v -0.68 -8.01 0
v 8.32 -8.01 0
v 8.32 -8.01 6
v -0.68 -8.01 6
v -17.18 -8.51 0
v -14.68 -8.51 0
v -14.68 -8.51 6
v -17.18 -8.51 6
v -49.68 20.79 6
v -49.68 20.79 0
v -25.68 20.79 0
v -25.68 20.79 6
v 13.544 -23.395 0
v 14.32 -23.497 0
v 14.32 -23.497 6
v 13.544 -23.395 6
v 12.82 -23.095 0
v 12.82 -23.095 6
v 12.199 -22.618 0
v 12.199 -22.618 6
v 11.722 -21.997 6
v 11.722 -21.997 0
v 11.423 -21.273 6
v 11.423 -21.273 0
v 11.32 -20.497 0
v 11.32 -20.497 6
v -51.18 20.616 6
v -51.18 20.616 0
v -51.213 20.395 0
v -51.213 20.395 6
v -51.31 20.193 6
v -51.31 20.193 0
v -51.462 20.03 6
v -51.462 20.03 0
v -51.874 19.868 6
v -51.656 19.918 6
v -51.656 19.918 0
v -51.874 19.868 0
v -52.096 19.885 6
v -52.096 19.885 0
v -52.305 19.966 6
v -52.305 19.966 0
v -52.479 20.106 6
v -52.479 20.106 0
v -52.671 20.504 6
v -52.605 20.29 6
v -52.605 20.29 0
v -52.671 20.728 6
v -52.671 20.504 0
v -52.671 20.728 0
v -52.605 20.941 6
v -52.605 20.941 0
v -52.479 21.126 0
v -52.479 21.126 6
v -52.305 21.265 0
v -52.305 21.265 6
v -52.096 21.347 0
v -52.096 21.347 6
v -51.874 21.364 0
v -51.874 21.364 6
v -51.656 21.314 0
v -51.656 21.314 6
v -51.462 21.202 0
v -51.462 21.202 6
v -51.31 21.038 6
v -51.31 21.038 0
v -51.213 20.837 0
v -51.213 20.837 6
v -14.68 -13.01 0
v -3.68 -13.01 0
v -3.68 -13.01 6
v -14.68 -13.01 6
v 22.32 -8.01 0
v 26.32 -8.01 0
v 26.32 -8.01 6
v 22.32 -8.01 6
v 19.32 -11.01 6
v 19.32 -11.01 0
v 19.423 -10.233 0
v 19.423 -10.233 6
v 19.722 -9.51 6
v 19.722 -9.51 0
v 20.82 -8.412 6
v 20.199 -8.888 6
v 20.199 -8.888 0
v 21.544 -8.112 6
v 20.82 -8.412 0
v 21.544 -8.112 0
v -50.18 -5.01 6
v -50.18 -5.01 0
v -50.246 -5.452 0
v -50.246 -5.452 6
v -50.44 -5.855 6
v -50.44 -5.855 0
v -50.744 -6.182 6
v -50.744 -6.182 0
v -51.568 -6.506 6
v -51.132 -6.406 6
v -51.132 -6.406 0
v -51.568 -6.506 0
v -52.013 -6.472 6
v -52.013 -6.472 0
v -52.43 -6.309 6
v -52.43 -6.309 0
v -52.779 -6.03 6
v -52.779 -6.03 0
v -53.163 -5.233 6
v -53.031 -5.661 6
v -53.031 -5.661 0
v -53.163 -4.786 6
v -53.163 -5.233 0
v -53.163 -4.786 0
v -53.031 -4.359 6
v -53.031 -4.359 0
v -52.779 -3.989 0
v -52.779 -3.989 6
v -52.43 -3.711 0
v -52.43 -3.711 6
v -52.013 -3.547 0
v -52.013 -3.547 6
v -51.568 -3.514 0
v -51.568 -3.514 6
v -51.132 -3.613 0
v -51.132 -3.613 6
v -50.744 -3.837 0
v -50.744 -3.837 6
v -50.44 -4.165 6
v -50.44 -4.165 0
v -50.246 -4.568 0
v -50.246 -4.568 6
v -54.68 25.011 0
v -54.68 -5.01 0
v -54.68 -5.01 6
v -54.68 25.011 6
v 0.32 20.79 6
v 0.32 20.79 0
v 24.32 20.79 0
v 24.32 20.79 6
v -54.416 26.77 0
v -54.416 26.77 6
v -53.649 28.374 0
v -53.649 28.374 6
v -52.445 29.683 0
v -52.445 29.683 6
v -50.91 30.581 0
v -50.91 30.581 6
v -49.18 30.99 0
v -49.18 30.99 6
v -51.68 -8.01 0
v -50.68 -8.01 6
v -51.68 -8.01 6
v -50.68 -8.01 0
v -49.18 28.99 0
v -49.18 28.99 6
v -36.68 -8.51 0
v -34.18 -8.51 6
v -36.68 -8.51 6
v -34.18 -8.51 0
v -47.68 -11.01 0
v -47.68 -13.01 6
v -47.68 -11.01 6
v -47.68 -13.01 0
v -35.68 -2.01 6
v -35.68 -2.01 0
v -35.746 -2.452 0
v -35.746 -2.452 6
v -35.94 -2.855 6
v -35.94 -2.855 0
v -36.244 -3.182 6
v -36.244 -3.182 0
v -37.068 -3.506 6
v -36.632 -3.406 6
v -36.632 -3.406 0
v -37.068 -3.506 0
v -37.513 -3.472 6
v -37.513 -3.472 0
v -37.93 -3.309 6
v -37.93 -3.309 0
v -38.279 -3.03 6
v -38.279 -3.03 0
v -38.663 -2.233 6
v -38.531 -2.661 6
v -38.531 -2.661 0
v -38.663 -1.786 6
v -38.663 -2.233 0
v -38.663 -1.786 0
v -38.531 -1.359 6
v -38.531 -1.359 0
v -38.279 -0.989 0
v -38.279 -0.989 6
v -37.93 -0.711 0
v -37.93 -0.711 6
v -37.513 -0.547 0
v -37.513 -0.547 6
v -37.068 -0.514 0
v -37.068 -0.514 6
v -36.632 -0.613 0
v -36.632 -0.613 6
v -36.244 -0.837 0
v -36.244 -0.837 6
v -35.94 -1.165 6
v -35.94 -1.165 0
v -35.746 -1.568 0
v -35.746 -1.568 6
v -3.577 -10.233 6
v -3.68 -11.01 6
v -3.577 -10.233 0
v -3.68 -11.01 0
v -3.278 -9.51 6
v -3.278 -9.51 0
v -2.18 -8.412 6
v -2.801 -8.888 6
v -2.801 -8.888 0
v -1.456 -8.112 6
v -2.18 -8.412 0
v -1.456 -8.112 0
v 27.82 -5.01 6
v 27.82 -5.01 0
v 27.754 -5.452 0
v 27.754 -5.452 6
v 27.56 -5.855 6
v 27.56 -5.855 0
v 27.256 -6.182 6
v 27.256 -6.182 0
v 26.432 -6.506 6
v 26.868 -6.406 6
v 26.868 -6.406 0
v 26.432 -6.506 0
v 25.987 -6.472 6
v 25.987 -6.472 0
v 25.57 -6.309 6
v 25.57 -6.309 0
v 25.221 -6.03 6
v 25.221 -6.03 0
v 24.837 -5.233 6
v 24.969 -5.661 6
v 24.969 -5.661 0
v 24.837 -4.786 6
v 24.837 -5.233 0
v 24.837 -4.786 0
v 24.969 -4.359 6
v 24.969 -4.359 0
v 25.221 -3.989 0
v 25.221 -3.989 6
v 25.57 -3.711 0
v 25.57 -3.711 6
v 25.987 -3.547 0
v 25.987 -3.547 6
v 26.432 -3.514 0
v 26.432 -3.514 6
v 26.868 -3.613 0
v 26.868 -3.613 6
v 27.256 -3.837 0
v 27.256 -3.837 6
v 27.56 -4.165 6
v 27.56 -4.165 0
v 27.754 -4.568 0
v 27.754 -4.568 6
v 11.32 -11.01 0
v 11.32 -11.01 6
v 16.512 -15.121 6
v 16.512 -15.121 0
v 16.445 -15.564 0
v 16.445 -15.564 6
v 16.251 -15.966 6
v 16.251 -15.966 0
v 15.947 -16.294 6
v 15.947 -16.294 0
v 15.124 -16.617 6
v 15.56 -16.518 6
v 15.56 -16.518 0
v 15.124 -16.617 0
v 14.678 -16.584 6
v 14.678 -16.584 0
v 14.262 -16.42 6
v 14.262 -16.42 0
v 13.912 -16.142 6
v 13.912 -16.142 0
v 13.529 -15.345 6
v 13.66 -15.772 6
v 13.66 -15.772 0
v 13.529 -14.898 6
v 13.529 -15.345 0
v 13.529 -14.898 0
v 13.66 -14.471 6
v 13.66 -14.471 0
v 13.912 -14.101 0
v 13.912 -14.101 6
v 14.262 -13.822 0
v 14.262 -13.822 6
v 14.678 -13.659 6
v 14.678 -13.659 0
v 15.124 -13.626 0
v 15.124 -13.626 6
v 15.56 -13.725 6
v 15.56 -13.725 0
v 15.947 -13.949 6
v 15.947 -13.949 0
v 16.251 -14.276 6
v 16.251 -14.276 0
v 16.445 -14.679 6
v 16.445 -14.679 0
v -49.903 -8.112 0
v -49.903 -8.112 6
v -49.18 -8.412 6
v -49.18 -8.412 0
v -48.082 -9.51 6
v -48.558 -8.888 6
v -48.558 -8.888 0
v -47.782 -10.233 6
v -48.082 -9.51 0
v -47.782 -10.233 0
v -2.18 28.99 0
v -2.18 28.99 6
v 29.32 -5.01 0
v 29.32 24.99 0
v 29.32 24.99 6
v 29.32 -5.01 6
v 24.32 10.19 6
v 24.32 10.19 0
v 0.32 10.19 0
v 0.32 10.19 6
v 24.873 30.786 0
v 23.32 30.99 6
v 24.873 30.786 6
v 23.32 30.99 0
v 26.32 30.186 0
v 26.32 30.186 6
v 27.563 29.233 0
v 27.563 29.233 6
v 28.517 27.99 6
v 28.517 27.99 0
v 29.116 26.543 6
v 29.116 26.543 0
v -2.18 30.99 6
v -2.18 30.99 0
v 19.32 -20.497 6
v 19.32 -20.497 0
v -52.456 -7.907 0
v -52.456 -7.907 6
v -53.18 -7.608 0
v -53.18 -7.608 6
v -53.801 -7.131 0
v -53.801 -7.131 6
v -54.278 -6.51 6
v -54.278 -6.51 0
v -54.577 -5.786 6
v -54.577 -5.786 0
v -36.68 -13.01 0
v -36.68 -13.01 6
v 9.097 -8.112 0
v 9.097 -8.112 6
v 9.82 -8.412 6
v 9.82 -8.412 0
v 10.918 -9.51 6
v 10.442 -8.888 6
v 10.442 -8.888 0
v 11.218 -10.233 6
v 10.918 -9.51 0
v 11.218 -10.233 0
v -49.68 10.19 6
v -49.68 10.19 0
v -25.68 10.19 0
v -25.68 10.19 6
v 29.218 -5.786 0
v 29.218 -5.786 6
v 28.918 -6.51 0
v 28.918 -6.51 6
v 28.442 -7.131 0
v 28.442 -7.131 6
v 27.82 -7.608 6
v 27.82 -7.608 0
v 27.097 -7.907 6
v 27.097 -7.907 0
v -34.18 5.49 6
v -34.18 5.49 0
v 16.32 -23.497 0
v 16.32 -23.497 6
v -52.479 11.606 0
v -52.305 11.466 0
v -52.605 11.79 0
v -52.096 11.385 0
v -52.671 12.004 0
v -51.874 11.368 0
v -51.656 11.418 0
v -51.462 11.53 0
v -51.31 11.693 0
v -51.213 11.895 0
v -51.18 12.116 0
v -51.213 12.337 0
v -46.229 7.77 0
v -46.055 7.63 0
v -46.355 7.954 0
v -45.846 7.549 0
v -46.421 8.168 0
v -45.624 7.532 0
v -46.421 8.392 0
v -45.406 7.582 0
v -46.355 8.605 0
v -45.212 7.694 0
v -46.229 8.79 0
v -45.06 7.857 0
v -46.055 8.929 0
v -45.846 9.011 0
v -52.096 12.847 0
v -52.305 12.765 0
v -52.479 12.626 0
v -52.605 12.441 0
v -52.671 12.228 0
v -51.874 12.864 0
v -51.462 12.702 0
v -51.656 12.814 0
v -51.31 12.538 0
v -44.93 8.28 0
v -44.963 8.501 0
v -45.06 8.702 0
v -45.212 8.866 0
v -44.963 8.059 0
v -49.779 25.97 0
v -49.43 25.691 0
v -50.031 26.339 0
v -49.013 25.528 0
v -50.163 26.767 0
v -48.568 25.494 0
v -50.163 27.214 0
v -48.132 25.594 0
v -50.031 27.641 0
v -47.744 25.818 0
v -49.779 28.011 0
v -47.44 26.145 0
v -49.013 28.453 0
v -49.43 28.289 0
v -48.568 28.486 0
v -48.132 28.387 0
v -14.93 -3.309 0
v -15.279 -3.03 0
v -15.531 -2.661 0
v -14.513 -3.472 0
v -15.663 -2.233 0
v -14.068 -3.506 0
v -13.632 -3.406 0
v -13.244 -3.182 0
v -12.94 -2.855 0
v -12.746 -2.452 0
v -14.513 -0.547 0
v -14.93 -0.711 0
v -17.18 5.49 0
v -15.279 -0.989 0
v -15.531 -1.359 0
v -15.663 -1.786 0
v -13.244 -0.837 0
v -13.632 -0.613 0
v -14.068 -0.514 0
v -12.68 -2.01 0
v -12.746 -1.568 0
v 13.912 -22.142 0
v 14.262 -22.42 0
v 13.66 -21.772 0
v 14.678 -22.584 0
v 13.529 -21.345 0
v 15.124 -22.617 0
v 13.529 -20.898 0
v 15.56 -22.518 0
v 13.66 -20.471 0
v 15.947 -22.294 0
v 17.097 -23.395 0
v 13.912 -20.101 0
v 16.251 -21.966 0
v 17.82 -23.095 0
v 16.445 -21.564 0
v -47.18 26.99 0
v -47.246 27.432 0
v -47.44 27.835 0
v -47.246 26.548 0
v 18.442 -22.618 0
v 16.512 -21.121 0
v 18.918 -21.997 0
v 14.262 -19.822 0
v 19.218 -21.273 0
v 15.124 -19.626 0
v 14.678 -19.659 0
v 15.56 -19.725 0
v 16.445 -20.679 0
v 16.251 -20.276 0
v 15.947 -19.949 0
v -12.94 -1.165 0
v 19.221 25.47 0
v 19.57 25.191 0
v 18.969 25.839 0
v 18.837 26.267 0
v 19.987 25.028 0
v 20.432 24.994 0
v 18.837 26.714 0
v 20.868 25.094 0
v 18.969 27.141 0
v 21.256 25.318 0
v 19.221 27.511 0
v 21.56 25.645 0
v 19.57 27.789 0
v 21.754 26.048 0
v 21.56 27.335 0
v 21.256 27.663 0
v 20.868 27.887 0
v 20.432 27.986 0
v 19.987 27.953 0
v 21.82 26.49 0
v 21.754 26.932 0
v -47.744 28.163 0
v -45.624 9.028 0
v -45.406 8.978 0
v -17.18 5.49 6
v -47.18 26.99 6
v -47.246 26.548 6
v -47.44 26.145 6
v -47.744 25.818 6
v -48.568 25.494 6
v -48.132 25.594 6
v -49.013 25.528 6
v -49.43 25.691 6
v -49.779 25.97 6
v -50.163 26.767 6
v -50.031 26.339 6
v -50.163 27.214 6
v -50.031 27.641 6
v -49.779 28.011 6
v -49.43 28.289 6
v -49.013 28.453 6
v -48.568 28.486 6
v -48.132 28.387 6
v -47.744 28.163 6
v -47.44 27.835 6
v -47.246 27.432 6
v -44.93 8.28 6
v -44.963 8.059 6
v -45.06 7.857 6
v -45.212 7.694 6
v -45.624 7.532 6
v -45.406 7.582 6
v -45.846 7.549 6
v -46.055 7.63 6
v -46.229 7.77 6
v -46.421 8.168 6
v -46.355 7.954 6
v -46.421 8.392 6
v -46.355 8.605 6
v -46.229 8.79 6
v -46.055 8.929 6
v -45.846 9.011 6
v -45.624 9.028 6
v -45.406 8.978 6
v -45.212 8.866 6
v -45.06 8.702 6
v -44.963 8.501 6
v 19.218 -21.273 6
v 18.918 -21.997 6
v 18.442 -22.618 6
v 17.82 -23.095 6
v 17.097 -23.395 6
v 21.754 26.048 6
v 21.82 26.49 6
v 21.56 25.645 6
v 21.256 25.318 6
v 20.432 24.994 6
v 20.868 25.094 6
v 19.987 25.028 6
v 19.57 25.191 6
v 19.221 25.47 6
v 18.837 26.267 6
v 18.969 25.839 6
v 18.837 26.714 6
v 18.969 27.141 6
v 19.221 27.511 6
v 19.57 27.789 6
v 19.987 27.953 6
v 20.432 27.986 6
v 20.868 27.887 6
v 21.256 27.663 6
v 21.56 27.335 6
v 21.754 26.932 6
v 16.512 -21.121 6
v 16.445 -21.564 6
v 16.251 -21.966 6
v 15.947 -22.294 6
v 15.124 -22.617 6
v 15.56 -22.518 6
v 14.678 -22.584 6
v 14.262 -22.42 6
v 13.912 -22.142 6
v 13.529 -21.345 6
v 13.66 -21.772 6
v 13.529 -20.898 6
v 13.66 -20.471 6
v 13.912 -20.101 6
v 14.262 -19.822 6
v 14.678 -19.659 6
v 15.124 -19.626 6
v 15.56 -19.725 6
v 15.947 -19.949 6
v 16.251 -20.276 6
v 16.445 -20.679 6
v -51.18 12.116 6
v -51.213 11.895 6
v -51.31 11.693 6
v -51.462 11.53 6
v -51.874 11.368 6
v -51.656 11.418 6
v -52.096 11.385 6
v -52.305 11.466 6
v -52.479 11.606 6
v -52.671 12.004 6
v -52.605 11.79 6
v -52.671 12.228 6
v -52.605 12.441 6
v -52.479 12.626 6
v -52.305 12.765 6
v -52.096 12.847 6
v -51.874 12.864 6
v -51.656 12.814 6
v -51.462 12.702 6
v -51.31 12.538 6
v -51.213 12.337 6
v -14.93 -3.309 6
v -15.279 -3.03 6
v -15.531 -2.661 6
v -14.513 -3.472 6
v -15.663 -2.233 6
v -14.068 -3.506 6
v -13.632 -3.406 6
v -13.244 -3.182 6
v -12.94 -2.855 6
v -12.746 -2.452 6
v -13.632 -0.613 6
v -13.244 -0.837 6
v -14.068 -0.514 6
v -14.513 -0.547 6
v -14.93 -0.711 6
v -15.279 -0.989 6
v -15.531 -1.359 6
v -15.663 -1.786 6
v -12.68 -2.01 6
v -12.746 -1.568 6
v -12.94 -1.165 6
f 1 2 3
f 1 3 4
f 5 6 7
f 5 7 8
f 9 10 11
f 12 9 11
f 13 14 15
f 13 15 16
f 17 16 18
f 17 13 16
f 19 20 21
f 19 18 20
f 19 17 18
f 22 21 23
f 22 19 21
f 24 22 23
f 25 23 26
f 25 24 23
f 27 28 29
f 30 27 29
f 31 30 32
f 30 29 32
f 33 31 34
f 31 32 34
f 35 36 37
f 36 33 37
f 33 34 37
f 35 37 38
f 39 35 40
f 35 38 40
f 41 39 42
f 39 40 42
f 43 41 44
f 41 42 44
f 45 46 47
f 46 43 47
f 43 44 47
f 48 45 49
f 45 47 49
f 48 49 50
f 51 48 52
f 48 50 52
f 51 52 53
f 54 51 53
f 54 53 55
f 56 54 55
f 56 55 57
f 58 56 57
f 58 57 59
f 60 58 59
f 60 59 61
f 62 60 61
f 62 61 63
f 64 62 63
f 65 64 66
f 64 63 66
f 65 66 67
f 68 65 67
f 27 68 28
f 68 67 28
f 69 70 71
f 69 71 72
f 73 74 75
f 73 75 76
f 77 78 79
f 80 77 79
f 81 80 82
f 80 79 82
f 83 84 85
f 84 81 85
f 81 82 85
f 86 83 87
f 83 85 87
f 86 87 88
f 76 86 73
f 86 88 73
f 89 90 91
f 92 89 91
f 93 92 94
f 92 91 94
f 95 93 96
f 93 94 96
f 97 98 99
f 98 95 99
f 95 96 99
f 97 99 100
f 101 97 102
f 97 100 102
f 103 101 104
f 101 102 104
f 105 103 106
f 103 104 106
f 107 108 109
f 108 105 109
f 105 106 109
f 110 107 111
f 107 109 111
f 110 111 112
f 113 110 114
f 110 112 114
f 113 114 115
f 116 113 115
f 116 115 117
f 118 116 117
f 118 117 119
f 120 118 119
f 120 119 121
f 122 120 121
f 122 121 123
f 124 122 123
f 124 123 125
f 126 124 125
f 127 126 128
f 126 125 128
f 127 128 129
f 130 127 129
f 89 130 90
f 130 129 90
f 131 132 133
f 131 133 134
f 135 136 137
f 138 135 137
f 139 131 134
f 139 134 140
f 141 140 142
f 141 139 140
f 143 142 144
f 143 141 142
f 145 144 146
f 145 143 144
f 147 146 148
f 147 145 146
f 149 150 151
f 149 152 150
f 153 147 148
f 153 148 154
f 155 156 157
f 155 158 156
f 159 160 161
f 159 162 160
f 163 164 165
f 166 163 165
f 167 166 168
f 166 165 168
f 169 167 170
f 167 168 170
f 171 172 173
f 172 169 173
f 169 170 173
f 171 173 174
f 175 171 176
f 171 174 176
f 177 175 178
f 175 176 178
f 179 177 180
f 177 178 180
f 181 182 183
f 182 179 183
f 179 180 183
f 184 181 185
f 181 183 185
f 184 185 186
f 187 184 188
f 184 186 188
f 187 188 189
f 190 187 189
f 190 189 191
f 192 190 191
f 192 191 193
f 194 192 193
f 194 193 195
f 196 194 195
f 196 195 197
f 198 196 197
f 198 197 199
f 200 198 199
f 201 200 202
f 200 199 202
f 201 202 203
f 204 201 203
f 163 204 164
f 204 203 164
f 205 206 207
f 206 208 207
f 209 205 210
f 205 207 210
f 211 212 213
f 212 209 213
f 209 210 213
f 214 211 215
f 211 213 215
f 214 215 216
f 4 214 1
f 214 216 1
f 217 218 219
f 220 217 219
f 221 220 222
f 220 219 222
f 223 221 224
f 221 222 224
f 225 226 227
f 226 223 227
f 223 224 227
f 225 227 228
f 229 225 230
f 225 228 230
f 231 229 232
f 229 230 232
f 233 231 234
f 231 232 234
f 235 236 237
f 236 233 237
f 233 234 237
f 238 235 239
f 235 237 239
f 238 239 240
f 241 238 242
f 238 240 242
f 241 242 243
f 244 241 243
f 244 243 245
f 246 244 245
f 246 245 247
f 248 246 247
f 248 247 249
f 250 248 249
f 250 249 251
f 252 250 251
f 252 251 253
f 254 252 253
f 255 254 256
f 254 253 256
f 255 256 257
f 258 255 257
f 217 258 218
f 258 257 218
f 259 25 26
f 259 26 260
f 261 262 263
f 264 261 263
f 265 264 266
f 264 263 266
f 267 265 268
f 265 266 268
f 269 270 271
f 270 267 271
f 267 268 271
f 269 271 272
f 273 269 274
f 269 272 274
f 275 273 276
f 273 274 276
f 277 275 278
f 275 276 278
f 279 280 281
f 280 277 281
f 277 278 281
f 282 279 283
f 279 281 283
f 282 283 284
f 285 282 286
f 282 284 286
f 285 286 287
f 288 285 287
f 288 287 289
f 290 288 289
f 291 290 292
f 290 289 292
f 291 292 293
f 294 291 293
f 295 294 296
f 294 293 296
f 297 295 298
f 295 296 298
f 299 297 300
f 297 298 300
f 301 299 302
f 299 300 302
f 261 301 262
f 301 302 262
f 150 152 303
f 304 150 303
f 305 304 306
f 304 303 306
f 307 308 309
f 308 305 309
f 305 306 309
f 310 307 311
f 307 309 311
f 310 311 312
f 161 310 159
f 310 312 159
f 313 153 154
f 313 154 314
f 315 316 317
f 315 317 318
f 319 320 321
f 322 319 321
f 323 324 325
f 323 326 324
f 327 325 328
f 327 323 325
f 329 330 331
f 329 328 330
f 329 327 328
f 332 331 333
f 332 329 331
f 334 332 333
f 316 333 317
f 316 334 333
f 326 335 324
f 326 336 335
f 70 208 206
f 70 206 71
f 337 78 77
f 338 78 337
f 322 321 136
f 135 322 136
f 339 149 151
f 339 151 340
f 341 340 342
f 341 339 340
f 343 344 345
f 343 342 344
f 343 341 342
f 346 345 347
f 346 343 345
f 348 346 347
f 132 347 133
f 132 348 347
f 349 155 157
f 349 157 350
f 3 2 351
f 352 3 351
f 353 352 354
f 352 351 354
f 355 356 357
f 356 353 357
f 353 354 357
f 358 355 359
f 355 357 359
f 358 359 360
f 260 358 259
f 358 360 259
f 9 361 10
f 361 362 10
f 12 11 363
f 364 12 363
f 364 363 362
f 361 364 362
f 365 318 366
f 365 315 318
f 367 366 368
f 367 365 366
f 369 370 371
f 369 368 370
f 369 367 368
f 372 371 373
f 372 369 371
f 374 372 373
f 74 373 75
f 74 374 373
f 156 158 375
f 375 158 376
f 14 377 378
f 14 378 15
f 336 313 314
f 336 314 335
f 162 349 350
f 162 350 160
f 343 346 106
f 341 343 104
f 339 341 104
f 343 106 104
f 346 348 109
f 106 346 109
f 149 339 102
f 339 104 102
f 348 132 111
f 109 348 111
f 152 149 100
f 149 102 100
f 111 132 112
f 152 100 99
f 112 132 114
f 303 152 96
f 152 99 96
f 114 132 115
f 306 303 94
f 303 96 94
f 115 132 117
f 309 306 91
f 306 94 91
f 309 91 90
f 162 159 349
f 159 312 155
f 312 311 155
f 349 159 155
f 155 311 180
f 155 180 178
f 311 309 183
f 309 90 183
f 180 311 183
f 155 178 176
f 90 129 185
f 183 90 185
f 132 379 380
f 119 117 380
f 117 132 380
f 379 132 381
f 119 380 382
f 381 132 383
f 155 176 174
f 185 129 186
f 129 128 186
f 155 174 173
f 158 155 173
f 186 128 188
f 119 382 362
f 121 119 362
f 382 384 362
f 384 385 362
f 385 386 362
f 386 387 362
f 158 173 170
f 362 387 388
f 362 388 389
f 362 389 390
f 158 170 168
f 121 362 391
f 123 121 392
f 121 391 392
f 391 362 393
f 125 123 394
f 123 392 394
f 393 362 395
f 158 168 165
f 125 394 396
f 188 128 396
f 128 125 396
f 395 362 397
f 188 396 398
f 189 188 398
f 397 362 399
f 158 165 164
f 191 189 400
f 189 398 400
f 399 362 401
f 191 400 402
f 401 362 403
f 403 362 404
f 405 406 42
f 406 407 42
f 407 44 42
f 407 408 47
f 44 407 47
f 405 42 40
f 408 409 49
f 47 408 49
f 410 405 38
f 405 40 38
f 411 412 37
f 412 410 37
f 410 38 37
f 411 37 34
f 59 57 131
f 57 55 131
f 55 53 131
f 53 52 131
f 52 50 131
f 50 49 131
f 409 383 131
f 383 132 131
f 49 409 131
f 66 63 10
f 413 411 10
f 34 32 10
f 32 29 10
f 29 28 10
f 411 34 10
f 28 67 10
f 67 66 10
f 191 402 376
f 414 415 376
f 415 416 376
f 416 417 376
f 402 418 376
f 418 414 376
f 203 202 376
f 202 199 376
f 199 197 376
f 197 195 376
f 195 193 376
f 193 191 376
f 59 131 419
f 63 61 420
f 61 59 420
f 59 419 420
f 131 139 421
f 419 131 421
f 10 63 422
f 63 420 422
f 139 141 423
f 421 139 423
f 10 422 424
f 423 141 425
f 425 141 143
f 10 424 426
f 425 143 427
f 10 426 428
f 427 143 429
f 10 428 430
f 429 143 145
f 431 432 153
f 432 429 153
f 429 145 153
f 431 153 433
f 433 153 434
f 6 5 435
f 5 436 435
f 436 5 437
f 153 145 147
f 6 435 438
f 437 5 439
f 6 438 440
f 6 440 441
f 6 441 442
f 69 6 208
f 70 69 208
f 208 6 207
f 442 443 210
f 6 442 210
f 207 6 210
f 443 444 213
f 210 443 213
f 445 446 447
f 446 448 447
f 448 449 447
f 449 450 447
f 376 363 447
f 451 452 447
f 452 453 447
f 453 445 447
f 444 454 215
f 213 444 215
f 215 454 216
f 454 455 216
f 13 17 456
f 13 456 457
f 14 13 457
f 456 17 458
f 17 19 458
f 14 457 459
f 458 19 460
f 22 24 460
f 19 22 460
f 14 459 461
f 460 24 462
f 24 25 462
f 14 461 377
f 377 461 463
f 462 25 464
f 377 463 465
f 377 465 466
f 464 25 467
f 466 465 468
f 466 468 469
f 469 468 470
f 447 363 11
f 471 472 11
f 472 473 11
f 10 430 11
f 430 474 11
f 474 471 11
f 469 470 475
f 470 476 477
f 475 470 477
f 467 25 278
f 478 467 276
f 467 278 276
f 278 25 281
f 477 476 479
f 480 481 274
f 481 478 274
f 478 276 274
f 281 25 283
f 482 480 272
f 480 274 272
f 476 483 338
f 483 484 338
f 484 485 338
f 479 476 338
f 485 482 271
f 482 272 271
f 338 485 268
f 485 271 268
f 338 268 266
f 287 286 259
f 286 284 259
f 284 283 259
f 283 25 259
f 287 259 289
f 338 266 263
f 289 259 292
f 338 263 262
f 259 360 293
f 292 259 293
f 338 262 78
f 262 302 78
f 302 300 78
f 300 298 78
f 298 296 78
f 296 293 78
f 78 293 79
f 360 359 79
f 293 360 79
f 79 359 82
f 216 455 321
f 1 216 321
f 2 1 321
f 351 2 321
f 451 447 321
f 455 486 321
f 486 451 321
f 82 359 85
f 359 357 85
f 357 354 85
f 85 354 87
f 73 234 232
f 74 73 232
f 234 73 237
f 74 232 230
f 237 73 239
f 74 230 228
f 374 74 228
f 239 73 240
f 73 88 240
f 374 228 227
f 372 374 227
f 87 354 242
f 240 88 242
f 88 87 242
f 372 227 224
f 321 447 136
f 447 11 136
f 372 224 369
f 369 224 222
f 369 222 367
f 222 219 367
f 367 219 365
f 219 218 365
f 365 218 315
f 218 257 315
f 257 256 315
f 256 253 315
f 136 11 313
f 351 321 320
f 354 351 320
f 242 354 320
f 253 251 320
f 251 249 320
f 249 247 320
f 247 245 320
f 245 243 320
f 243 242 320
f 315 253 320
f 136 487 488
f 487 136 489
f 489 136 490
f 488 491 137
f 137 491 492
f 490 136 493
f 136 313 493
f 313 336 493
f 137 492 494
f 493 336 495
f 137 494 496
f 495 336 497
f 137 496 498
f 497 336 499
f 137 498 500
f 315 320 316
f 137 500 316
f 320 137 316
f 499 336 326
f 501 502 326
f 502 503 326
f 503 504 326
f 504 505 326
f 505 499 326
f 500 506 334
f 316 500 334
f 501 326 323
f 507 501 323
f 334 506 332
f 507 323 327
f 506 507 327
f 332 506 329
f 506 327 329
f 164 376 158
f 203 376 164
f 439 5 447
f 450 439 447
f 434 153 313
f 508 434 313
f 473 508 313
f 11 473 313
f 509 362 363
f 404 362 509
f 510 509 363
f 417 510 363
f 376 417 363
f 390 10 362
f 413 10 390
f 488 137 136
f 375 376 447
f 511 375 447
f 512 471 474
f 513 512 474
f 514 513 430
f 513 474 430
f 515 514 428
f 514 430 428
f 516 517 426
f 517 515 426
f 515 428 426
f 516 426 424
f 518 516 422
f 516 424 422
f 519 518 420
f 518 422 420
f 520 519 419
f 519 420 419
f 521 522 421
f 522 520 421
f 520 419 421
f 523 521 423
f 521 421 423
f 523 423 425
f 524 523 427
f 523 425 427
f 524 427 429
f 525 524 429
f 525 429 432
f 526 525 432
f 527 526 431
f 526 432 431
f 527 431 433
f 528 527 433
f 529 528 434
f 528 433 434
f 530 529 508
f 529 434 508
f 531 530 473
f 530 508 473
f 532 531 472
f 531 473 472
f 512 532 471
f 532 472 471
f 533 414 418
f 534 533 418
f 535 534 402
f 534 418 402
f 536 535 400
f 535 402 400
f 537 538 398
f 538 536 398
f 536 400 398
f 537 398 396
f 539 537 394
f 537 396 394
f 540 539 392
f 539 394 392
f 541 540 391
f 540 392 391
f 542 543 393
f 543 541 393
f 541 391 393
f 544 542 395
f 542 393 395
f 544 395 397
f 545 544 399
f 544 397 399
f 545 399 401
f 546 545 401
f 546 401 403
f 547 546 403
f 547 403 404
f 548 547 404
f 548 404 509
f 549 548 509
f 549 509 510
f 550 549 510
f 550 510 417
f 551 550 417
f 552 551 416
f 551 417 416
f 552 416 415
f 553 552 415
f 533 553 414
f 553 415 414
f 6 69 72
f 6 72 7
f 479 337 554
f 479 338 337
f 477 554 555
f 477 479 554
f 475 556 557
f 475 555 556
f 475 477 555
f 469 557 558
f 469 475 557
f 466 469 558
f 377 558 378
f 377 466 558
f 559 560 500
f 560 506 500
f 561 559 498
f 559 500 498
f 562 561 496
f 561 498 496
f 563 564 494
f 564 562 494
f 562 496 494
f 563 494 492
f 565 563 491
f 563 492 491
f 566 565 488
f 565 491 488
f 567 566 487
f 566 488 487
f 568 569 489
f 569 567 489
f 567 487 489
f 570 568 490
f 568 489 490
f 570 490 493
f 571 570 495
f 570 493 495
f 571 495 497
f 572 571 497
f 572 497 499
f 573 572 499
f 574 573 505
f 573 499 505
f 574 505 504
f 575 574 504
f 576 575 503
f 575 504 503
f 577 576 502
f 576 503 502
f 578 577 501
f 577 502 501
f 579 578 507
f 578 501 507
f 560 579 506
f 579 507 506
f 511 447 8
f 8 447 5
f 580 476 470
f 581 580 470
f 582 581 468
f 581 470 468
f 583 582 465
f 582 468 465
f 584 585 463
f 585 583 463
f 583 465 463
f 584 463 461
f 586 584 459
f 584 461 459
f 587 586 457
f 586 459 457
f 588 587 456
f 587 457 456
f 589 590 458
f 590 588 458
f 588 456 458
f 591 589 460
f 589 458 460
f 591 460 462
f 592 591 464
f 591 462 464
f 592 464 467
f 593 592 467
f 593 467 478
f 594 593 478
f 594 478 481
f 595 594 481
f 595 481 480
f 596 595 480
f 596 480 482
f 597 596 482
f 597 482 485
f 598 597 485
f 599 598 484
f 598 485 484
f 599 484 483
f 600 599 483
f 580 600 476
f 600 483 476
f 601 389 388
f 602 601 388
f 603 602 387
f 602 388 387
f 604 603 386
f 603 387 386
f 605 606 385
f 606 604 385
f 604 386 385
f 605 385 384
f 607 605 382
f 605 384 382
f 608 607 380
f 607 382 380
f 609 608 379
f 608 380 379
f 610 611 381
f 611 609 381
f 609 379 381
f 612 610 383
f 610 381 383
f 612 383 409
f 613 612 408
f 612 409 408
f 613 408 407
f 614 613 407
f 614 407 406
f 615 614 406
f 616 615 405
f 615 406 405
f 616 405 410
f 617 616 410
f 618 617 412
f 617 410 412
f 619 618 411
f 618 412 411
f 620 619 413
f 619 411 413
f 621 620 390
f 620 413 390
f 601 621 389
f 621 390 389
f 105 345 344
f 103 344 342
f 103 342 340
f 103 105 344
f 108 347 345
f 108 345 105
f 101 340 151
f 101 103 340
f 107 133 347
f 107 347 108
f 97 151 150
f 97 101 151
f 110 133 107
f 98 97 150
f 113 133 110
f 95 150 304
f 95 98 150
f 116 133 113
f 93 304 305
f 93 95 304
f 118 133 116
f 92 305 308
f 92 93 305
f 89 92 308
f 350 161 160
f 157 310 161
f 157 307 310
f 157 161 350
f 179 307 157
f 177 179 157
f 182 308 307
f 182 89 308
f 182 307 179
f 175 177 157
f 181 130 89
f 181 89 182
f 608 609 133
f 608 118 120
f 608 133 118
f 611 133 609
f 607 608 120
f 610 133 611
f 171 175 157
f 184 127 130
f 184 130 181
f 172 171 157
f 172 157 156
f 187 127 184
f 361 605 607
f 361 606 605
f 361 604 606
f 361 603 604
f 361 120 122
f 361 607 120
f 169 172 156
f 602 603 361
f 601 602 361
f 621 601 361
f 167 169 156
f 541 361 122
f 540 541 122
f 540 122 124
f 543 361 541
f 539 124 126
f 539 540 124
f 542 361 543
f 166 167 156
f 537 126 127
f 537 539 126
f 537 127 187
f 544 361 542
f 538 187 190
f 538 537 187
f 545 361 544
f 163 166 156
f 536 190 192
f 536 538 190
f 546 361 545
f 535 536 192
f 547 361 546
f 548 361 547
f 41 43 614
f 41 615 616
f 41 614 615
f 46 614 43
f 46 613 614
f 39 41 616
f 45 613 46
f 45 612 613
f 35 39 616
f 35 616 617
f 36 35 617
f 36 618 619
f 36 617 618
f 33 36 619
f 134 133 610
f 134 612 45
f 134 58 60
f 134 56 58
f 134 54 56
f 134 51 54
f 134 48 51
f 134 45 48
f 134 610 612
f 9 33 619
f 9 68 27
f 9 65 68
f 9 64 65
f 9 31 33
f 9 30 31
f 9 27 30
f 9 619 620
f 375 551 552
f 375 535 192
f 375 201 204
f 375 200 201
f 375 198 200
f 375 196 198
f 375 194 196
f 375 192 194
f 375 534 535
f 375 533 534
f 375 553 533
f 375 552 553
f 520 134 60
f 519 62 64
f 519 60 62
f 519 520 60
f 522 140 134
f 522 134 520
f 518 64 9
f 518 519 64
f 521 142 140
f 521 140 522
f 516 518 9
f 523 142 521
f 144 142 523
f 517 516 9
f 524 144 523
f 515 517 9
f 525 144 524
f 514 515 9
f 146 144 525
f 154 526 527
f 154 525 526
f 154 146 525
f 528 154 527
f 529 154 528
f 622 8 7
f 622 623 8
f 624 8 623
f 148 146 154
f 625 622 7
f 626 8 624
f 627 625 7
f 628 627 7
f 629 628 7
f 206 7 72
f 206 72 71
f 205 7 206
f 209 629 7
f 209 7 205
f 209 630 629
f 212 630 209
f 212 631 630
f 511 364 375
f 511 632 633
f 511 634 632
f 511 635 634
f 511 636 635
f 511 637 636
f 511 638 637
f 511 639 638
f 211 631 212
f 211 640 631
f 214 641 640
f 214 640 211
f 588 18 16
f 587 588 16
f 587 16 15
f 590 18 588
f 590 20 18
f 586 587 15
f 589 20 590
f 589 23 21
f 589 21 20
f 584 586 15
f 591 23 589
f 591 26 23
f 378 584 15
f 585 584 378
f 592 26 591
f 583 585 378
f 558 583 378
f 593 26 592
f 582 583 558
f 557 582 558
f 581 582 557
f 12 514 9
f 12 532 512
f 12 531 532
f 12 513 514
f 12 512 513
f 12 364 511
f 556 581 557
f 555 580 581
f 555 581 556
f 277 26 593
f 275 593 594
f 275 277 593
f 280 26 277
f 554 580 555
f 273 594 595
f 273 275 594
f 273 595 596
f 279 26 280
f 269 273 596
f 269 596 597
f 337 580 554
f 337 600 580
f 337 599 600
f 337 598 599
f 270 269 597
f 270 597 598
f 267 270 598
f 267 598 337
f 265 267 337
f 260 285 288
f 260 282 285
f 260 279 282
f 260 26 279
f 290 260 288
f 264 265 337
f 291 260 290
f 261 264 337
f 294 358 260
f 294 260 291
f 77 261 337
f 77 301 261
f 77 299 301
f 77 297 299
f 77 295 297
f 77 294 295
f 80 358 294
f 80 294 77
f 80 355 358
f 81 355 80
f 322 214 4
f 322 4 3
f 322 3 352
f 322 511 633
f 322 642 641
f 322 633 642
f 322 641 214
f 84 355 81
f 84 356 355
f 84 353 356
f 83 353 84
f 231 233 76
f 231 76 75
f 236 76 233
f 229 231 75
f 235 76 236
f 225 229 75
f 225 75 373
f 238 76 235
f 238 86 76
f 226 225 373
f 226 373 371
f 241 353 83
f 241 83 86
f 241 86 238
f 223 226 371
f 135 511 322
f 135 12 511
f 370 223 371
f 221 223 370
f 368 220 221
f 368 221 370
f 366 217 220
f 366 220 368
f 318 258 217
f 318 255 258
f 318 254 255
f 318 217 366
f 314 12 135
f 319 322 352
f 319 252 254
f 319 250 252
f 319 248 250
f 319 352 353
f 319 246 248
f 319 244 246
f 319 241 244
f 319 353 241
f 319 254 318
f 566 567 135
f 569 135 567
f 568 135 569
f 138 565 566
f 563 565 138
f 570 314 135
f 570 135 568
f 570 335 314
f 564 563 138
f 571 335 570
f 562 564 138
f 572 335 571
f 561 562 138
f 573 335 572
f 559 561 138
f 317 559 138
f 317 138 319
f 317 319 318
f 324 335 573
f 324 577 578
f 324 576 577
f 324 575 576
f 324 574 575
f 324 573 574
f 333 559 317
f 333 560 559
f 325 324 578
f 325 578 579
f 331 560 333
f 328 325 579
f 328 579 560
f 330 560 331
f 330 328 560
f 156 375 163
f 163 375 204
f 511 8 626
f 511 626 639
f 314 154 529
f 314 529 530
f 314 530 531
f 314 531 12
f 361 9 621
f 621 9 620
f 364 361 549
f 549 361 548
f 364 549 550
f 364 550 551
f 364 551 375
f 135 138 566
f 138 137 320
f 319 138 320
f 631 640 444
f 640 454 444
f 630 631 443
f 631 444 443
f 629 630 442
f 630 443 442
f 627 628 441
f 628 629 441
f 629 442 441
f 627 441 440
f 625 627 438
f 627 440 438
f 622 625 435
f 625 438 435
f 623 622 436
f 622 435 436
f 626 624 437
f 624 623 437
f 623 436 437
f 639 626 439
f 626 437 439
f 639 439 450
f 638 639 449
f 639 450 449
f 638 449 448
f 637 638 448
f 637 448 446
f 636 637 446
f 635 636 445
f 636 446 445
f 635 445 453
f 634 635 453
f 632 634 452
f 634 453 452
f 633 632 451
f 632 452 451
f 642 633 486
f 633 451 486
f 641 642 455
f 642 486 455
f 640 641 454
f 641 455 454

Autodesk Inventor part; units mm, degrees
ref_plane "YZ Plane" through (0, 0, 0) normal (1, 0, 0) x (0, 1, 0)
ref_plane "XZ Plane" through (0, 0, 0) normal (0, 1, 0) x (-1, 0, 0)
ref_plane "XY Plane" through (0, 0, 0) normal (0, 0, 1) x (1, 0, 0)
sketch "Sketch1" plane through (0, 0, 0) normal (0, 0, 1) x (1, 0, 0)
  line L0 (-34.1796, -8.5097) -> (-34.1796, 5.4903)
  line L1 (-34.1796, 5.4903) -> (-17.1796, 5.4903)
  line L2 (-17.1796, 5.4903) -> (-17.1796, -8.5097)
  line L3 (-14.6796, -8.5097) -> (-17.1796, -8.5097)
  line L4 (-14.6796, -13.0097) -> (-14.6796, -8.5097)
  line L5 (-3.6796, -13.0097) -> (-14.6796, -13.0097)
  line L6 (-3.6796, -11.0097) -> (-3.6796, -13.0097)
  arc A0 (-0.6796, -8.0097) -> (-3.6796, -11.0097) centre (-0.6796, -11.0097) ccw
  line L7 (8.3204, -8.0097) -> (-0.6796, -8.0097)
  arc A1 (11.3204, -11.0097) -> (8.3204, -8.0097) centre (8.3204, -11.0097) ccw
  line L8 (11.3204, -20.4968) -> (11.3204, -11.0097)
  arc A2 (11.3204, -20.4968) -> (14.3204, -23.4968) centre (14.3204, -20.4968) ccw
  line L9 (16.3204, -23.4968) -> (14.3204, -23.4968)
  arc A3 (16.3204, -23.4968) -> (19.3204, -20.4968) centre (16.3204, -20.4968) ccw
  line L10 (19.3204, -11.0097) -> (19.3204, -20.4968)
  arc A4 (22.3204, -8.0097) -> (19.3204, -11.0097) centre (22.3204, -11.0097) ccw
  line L11 (26.3204, -8.0097) -> (22.3204, -8.0097)
  arc A5 (26.3204, -8.0097) -> (29.3204, -5.0097) centre (26.3204, -5.0097) ccw
  line L12 (29.3204, 24.9903) -> (29.3204, -5.0097)
  arc A6 (29.3204, 24.9903) -> (23.3204, 30.9903) centre (23.3204, 24.9903) ccw
  line L13 (-2.1796, 30.9903) -> (23.3204, 30.9903)
  line L14 (-2.1796, 28.9903) -> (-2.1796, 30.9903)
  line L15 (-49.1796, 28.9903) -> (-2.1796, 28.9903)
  line L16 (-49.1796, 30.9903) -> (-49.1796, 28.9903)
  arc A7 (-49.1796, 30.9903) -> (-54.6796, 25.0112) centre (-48.6796, 25.0112) ccw
  line L17 (-54.6796, -5.0097) -> (-54.6796, 25.0112)
  arc A8 (-54.6796, -5.0097) -> (-51.6796, -8.0097) centre (-51.6796, -5.0097) ccw
  line L18 (-50.6796, -8.0097) -> (-51.6796, -8.0097)
  arc A9 (-47.6796, -11.0097) -> (-50.6796, -8.0097) centre (-50.6796, -11.0097) ccw
  line L19 (-47.6796, -13.0097) -> (-47.6796, -11.0097)
  line L20 (-36.6796, -13.0097) -> (-47.6796, -13.0097)
  line L21 (-36.6796, -8.5097) -> (-36.6796, -13.0097)
  line L22 (-34.1796, -8.5097) -> (-36.6796, -8.5097)
  circle A10 centre (15.0119, -15.1214) radius 1.5
  circle A11 centre (15.0119, -21.1214) radius 1.5
  circle A12 centre (-51.9296, 20.6159) radius 0.75
  circle A13 centre (-51.9296, 12.1159) radius 0.75
  circle A14 centre (-45.6796, 8.2799) radius 0.75
  circle A15 centre (-48.6796, 26.9903) radius 1.5
  circle A16 centre (26.3204, -5.0097) radius 1.5
  circle A17 centre (-14.1796, -2.0097) radius 1.5
  circle A18 centre (-51.6796, -5.0097) radius 1.5
  circle A19 centre (20.3204, 26.4903) radius 1.5
  circle A20 centre (-37.1796, -2.0097) radius 1.5
  line L23 (-49.6796, 10.1903) -> (-49.6796, 20.7903)
  line L24 (-49.6796, 20.7903) -> (-25.6796, 20.7903)
  line L25 (-25.6796, 20.7903) -> (-25.6796, 10.1903)
  line L26 (-25.6796, 10.1903) -> (-49.6796, 10.1903)
  line L27 (0.3204, 20.7903) -> (24.3204, 20.7903)
  line L28 (24.3204, 20.7903) -> (24.3204, 10.1903)
  line L29 (24.3204, 10.1903) -> (0.3204, 10.1903)
  line L30 (0.3204, 10.1903) -> (0.3204, 20.7903)
  point P0 (0, 0)
  point P1 (0, 0)
extrude "Extrusion1" add sketch "Sketch1" along normal blind 6
properties part number "XcrRight_a"
